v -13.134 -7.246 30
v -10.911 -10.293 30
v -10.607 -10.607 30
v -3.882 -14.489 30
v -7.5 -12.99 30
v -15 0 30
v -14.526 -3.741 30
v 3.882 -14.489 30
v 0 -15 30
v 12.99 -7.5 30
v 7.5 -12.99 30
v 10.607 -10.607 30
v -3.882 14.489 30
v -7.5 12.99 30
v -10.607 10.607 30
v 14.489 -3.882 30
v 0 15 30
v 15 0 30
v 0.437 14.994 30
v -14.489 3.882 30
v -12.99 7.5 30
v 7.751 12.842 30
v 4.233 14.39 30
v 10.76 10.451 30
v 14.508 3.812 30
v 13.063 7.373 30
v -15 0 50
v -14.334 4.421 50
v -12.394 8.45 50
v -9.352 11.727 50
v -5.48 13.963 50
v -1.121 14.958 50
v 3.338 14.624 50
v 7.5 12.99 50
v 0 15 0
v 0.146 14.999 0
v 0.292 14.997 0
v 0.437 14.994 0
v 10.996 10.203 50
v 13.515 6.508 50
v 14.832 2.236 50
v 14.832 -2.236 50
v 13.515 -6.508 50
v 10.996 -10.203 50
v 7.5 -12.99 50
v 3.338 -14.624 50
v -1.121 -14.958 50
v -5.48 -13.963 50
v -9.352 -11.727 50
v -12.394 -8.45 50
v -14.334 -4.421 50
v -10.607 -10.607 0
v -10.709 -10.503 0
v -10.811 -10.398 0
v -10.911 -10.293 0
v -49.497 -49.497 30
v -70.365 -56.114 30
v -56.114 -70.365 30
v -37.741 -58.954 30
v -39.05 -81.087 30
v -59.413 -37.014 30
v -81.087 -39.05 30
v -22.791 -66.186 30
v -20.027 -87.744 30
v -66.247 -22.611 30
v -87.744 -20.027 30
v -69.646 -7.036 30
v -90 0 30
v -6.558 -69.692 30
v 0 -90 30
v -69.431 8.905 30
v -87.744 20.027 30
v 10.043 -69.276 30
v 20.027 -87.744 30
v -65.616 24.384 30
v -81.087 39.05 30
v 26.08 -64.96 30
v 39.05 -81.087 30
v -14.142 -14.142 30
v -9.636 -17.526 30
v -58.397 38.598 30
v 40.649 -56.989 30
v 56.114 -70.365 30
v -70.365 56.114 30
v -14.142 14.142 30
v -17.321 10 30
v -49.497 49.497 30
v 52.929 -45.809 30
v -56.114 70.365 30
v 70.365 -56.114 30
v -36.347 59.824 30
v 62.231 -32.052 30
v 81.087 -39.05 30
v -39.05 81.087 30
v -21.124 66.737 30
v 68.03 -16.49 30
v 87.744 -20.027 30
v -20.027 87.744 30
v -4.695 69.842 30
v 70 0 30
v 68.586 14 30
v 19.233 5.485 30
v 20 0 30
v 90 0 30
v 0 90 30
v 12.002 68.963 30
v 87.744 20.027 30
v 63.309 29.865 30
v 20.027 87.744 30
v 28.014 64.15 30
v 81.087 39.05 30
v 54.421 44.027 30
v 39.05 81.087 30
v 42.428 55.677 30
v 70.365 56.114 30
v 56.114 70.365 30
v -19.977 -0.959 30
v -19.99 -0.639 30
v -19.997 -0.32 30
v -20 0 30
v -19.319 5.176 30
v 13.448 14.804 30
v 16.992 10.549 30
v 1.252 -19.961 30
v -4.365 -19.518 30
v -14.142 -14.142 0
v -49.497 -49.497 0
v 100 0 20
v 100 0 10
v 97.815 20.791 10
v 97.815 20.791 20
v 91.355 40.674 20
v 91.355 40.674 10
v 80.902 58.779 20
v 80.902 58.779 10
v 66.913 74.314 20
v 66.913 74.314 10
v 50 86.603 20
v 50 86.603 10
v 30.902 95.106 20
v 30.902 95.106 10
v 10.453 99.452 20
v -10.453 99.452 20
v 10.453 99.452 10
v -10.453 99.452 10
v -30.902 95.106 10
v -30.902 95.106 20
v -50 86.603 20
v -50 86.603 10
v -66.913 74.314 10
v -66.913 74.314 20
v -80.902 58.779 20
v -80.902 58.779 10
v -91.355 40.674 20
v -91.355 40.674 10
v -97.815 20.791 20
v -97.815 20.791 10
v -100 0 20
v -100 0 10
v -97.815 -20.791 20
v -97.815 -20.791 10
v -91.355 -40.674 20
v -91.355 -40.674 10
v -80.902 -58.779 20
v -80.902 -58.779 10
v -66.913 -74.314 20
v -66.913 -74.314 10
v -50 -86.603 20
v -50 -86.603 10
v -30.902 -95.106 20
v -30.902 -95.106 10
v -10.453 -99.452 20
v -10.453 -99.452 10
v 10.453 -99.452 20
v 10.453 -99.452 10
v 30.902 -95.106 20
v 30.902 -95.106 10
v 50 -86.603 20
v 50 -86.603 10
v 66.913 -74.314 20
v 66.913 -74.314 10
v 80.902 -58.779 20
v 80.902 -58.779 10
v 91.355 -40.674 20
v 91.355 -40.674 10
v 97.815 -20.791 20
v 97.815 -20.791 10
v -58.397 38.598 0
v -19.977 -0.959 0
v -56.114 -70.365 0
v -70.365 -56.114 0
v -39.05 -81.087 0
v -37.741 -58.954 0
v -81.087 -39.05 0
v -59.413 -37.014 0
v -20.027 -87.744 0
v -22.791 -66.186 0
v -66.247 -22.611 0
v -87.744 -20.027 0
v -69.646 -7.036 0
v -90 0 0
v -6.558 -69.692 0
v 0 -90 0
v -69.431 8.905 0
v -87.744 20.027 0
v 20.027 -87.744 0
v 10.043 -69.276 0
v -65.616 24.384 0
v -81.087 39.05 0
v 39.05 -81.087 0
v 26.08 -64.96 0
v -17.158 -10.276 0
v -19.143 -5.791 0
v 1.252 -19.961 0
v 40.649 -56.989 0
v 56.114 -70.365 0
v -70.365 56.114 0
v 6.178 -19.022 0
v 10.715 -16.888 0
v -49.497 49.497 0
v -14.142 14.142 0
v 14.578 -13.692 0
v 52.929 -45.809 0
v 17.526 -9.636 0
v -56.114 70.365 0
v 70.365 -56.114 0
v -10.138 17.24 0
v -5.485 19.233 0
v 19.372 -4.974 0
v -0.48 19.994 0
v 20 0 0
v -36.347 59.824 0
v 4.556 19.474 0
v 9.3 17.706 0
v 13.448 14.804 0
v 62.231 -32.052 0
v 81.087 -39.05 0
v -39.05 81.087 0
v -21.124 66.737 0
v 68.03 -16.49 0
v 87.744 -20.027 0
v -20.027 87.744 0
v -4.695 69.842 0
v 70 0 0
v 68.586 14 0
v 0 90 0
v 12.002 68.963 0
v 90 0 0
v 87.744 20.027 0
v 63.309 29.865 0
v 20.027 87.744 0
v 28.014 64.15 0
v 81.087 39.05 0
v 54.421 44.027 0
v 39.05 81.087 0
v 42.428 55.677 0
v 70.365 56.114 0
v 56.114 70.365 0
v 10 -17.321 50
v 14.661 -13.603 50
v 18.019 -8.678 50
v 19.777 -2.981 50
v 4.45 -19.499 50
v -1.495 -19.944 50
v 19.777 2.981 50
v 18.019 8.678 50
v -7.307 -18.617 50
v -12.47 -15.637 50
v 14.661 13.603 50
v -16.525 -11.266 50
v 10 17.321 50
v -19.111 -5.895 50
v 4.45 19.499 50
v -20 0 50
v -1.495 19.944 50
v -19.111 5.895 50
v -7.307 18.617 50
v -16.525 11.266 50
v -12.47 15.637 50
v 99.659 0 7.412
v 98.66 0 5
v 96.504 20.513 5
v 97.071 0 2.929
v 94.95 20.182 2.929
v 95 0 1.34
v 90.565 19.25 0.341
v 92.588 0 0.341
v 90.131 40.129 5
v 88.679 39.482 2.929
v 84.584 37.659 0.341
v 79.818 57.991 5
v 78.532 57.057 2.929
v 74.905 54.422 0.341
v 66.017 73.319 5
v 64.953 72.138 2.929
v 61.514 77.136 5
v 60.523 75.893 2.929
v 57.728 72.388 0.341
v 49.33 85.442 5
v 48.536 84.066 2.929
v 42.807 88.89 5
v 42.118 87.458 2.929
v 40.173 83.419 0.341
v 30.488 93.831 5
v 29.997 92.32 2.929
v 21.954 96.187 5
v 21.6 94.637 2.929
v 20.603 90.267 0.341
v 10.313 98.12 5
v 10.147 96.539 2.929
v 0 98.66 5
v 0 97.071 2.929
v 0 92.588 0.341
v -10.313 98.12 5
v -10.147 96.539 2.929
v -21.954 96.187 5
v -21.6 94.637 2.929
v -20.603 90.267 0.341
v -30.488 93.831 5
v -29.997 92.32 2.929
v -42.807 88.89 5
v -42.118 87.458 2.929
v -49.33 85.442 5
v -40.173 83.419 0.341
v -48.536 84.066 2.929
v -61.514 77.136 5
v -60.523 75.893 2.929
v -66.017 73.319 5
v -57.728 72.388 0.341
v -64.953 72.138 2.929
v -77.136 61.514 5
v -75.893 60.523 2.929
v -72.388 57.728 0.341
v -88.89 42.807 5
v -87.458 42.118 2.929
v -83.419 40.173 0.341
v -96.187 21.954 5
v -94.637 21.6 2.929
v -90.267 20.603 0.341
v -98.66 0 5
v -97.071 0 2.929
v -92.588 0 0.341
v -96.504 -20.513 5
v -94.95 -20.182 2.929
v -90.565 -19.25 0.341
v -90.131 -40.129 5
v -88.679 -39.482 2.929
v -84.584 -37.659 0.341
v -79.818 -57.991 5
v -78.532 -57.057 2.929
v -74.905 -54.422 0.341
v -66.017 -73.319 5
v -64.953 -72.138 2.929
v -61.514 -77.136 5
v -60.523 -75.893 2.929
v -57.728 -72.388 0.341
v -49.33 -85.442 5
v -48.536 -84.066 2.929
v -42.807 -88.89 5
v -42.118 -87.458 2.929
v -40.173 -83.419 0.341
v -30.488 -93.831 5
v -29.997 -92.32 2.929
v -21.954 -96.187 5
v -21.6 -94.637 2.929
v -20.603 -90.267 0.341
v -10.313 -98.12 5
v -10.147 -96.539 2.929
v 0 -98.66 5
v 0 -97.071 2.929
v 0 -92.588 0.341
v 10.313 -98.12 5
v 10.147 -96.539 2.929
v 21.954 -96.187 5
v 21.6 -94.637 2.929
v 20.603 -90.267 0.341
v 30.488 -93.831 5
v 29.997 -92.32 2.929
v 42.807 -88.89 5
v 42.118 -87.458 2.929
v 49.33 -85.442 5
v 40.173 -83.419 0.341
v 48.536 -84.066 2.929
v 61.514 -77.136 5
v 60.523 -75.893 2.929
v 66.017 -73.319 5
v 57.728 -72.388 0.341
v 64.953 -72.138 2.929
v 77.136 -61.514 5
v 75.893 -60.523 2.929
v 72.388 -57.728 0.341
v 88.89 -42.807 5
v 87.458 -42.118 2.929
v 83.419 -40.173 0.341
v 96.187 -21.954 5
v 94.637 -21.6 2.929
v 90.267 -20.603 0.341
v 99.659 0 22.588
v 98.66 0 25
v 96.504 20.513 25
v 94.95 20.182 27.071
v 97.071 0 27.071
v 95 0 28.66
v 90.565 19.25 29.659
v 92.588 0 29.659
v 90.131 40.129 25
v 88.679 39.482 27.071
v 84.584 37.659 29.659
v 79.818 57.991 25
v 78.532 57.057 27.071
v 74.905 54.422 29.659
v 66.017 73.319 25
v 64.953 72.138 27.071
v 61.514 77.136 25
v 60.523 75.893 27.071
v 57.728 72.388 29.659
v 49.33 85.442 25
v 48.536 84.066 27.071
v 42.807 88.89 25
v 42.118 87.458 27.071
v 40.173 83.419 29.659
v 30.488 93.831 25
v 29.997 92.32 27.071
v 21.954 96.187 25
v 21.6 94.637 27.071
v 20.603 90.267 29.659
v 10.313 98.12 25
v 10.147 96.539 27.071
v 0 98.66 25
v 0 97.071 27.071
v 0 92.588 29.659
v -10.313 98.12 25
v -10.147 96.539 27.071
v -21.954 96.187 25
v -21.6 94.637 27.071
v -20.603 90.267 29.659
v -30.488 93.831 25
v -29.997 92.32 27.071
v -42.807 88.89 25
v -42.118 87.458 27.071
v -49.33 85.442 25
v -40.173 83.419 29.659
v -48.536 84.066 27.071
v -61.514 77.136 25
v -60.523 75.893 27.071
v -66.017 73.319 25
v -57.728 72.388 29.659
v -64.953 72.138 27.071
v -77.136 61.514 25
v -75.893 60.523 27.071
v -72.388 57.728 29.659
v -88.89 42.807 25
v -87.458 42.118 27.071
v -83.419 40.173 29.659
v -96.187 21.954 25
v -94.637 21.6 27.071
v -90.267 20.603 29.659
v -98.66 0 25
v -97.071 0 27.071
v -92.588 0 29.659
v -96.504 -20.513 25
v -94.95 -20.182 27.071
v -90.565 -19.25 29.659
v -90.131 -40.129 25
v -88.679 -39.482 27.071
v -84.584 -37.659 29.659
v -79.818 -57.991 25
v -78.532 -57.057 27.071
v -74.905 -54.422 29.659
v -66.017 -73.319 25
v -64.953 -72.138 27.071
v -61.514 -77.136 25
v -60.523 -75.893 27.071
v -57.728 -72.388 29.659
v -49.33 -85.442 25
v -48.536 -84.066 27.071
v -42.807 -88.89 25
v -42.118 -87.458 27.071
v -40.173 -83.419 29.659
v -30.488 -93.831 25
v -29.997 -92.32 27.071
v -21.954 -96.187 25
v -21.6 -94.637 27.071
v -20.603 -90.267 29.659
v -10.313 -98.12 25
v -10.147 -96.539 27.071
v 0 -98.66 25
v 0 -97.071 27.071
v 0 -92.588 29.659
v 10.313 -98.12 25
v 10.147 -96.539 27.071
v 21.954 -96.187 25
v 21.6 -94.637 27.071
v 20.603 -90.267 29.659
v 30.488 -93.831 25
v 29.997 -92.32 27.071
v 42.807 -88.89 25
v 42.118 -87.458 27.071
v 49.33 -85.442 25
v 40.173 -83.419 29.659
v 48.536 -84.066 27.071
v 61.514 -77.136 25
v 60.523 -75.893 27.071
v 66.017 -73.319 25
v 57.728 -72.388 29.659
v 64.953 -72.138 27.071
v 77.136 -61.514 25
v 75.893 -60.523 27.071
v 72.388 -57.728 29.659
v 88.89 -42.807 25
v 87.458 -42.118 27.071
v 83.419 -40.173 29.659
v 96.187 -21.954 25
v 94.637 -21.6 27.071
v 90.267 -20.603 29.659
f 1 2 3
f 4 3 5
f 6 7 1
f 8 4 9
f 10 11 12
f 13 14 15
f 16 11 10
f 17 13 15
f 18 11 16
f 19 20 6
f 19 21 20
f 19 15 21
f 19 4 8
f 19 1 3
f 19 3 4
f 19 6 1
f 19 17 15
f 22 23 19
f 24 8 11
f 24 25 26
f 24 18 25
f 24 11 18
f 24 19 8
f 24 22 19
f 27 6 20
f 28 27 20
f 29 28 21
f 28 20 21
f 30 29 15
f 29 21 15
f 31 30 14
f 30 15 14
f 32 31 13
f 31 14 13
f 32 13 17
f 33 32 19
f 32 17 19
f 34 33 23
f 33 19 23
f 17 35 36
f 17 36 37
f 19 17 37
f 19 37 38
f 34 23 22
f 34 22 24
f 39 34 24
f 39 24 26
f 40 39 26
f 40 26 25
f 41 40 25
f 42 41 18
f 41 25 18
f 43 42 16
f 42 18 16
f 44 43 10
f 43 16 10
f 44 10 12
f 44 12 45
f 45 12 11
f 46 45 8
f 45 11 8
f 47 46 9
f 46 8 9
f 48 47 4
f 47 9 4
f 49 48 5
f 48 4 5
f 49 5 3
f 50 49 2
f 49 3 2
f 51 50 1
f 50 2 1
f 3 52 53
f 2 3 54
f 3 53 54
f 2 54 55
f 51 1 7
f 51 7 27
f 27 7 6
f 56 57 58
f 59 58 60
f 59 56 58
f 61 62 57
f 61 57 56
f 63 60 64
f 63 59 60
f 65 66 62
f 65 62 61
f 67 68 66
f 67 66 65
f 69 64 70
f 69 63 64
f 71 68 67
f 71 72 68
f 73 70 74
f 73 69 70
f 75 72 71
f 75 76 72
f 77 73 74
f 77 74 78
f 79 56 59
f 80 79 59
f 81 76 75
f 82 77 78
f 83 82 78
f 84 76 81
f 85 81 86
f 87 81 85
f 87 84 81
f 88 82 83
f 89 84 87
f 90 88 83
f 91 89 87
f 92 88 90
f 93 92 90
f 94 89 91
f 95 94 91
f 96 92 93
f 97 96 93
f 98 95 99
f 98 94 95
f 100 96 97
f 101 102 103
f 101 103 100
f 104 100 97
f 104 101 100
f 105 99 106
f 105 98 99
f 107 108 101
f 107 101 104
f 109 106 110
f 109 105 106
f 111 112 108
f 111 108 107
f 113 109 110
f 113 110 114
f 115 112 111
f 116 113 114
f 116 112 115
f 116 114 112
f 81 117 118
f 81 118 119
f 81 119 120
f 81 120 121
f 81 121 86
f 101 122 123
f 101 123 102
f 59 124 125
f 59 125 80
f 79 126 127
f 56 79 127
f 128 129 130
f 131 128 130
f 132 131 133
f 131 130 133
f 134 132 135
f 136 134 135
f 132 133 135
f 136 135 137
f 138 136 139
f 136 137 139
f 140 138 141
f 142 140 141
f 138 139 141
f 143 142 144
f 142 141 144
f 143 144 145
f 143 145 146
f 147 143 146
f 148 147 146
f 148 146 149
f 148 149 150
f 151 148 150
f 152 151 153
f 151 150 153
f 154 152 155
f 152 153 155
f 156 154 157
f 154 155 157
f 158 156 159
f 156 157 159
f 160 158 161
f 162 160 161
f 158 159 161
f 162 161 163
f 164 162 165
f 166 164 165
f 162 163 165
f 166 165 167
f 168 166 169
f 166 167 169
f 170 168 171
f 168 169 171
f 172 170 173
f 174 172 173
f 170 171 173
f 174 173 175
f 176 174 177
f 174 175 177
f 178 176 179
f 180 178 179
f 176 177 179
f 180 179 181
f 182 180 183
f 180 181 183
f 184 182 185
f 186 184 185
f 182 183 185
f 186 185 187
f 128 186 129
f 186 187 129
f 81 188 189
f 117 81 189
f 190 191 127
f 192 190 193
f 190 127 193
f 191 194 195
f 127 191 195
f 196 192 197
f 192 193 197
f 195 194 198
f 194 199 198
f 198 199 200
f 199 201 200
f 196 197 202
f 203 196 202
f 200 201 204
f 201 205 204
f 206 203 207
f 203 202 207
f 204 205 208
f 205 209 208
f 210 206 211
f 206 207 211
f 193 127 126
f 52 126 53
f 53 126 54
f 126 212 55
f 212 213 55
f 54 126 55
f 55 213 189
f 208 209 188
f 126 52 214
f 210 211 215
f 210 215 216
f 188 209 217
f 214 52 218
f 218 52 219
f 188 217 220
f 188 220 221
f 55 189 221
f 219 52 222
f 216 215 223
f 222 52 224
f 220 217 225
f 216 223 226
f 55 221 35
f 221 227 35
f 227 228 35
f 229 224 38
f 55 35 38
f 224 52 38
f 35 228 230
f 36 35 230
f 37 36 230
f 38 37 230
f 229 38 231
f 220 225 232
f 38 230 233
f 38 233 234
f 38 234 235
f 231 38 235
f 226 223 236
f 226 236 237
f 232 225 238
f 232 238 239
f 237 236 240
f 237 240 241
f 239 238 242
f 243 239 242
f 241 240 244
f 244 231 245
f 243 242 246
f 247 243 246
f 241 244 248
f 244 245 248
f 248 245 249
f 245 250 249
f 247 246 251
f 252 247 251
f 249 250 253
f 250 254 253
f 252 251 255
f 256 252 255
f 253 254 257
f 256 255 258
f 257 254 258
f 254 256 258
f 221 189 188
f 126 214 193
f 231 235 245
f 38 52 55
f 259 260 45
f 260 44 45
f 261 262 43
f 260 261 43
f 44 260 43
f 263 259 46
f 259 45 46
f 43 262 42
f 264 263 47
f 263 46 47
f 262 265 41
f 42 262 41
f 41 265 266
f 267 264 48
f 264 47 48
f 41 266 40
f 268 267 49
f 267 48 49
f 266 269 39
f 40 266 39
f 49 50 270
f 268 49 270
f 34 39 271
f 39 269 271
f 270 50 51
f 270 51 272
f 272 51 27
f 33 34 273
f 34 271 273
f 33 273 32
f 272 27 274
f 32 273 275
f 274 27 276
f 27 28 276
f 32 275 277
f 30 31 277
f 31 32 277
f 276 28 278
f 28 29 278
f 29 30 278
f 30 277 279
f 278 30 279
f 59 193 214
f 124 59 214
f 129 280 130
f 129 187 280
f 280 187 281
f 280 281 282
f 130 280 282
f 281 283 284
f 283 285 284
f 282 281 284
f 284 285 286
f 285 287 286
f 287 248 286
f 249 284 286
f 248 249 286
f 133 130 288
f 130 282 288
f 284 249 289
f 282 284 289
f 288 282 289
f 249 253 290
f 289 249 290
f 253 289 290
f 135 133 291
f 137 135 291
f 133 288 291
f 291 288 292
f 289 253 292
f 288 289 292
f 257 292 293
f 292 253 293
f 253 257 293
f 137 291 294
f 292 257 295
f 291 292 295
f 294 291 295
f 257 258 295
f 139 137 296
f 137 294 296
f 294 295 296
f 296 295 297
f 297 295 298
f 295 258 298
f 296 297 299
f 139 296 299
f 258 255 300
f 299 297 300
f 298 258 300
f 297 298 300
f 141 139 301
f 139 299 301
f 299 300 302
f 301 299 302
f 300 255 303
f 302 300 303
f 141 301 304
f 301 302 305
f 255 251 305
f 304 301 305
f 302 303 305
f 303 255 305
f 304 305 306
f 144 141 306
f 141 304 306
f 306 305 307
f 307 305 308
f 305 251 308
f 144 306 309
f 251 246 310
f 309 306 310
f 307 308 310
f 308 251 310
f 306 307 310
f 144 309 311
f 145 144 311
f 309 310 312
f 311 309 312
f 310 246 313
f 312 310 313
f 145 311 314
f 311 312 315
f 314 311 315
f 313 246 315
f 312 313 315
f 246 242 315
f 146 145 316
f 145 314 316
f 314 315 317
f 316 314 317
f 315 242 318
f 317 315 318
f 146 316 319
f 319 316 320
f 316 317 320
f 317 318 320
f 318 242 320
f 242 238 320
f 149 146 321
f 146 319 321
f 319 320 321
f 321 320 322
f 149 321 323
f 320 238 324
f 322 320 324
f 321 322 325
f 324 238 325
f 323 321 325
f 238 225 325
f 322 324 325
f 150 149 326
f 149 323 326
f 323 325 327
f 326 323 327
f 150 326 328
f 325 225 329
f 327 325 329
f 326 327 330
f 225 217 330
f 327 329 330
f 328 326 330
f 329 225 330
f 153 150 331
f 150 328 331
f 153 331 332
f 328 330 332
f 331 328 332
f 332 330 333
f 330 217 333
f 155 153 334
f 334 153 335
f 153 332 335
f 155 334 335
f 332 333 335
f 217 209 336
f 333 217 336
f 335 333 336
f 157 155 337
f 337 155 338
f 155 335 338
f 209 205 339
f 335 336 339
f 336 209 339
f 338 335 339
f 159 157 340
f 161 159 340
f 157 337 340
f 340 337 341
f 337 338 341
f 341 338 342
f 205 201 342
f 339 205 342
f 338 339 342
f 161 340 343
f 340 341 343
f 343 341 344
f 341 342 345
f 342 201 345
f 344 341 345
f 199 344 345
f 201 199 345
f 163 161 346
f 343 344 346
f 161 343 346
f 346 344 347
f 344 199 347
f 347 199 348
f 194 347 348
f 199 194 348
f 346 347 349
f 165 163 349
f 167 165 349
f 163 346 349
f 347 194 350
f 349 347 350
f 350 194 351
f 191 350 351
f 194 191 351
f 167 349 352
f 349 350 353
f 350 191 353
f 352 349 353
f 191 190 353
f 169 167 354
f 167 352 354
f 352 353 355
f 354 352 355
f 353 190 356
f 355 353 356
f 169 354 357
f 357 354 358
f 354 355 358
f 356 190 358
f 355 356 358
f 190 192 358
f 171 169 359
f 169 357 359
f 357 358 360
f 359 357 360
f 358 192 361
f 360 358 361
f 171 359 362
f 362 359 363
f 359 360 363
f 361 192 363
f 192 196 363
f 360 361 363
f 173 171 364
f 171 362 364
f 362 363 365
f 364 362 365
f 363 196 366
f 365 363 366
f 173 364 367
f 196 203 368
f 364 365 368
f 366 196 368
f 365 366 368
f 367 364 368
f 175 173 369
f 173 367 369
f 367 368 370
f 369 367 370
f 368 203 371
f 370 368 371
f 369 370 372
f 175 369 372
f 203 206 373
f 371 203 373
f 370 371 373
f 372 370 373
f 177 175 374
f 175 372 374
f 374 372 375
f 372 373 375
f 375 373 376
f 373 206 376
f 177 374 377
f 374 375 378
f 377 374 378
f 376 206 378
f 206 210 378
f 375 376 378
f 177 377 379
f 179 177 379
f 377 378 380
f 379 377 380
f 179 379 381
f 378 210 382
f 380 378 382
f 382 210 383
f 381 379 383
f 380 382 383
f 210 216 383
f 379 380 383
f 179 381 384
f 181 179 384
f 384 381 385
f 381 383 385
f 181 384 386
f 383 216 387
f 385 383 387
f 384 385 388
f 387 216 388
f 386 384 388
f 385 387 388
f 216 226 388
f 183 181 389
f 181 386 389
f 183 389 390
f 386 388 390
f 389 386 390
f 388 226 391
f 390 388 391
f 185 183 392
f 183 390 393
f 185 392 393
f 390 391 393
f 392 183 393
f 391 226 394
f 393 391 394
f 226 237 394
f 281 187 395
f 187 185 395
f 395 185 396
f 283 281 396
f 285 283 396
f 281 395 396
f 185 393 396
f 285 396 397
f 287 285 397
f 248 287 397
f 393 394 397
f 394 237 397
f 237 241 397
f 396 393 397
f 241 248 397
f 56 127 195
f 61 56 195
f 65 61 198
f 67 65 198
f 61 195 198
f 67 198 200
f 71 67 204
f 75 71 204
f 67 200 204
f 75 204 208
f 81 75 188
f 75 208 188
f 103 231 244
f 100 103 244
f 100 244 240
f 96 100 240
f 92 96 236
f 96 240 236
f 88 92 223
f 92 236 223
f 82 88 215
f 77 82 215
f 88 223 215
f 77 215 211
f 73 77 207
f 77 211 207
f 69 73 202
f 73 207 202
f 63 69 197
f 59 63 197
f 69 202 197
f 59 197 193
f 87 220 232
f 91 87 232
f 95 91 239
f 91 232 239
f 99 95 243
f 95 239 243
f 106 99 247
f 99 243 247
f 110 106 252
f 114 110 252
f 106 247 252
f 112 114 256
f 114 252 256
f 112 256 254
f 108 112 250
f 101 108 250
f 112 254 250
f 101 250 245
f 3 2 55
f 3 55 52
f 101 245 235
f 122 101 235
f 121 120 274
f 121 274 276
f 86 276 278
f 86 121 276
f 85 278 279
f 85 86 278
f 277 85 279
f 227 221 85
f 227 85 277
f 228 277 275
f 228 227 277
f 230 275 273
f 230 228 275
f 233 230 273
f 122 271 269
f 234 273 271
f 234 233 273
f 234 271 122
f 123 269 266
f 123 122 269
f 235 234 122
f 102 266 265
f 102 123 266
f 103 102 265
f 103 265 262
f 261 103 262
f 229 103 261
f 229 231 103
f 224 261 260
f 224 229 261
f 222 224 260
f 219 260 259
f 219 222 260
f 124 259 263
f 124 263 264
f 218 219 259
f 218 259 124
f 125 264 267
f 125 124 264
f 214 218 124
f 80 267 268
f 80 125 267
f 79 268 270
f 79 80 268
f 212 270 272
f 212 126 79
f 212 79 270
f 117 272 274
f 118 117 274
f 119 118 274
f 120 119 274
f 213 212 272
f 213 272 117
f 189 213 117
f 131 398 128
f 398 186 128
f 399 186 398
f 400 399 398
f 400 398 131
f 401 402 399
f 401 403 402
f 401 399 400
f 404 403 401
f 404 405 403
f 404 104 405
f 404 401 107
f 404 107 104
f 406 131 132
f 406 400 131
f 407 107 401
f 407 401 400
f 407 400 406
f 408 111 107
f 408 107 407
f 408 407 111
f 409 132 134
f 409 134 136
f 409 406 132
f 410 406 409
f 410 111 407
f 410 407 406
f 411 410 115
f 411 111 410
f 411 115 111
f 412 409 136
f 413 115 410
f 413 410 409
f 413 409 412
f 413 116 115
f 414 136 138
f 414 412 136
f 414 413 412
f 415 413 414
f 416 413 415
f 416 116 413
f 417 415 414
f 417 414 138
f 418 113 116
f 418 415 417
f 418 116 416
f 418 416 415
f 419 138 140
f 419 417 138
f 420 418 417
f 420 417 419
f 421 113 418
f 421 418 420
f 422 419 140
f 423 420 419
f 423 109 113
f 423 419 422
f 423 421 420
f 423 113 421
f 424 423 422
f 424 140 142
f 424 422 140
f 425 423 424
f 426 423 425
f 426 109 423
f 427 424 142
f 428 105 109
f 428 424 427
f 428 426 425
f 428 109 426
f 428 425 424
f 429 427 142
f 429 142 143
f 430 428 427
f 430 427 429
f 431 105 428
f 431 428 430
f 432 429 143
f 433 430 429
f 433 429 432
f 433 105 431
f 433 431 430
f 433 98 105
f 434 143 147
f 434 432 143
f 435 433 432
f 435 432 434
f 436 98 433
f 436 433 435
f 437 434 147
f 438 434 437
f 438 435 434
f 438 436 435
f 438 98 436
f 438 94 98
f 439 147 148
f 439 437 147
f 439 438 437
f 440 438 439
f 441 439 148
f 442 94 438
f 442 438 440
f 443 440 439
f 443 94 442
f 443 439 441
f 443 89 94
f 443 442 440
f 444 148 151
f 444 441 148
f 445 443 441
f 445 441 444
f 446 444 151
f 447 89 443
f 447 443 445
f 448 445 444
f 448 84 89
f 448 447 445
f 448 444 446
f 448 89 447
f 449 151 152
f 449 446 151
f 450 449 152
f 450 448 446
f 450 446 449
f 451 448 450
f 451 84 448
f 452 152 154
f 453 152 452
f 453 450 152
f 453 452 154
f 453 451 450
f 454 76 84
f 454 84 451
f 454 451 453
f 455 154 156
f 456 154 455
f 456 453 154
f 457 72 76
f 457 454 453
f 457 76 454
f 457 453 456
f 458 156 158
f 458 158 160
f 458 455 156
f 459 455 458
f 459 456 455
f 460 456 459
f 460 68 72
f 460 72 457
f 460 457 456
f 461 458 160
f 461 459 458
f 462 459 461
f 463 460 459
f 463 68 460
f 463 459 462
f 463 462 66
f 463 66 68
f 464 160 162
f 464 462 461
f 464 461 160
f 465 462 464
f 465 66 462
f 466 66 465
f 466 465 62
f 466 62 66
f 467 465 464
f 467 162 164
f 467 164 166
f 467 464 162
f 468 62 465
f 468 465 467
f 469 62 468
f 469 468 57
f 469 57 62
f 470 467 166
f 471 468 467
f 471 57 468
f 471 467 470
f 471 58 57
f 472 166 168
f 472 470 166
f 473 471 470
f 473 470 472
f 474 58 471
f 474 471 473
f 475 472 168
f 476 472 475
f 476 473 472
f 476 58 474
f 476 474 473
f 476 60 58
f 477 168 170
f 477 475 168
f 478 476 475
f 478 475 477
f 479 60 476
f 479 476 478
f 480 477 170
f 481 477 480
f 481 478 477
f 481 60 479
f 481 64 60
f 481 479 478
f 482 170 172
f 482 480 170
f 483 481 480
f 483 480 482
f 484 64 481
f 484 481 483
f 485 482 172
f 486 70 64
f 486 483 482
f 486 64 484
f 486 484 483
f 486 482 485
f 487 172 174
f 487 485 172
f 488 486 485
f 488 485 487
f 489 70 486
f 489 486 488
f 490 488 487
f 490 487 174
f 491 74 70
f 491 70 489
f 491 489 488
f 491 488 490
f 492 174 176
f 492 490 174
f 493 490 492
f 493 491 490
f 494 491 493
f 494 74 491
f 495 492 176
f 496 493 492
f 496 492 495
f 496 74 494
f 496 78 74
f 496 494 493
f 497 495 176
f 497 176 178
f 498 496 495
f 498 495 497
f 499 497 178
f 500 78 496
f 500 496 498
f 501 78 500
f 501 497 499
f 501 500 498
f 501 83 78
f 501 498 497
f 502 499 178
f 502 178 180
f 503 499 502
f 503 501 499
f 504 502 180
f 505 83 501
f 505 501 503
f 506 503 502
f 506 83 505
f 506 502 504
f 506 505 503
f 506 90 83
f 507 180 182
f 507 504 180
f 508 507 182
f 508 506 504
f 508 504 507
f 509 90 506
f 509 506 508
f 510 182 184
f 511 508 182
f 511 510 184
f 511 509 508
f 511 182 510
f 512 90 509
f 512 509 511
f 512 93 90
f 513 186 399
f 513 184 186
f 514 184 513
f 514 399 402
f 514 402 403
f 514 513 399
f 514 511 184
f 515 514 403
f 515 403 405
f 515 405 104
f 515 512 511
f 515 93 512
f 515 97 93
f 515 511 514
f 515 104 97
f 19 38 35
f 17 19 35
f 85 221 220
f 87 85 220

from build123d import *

# Parameters (mm, degrees)
SKETCH1_R           = 100
BOSS_EXTRUDE1_DEPTH = 30
FILLET2_R           = 10
SKETCH2_R           = 20
SKETCH2_R_2         = 15
BOSS_EXTRUDE2_DEPTH = 50


with BuildPart() as part:
    # Sketch1 → Boss-Extrude1 (new body)
    with BuildSketch(Plane.XY):
        Circle(SKETCH1_R)
        with BuildLine():
            Line((-10.606601718, -10.606601718), (-49.497474683, -49.497474683))
            ThreePointArc((-49.497474683, -49.497474683), (-69.64553071, -7.03562734), (-58.396917549, 38.597927675))
            Line((-58.396917549, 38.597927675), (-10.606601718, -10.606601718))
        make_face(mode=Mode.SUBTRACT)
        with BuildLine():
            ThreePointArc((10.606601718, -10.606601718), (13.858192988, -5.740251485), (15, 0))
            Line((15, 0), (70, 0))
            ThreePointArc((70, 0), (33.601511791, -61.407966954), (-37.741097297, -58.954300732))
            Line((-37.741097297, -58.954300732), (10.606601718, -10.606601718))
        make_face(mode=Mode.SUBTRACT)
        with BuildLine():
            ThreePointArc((0, 15), (-5.740251485, 13.858192988), (-10.606601718, 10.606601718))
            Line((-10.606601718, 10.606601718), (-49.497474683, 49.497474683))
            ThreePointArc((-49.497474683, 49.497474683), (20.152118643, 67.036498374), (68.585712798, 14))
            Line((68.585712798, 14), (0, 15))
        make_face(mode=Mode.SUBTRACT)
    extrude(amount=BOSS_EXTRUDE1_DEPTH)

    # Fillet2
    fillet2_edges = [part.edges().sort_by_distance(p)[0] for p in [
        (-100, 0, 0),
        (-100, 0, 30),
    ]]
    fillet(fillet2_edges, radius=FILLET2_R)

    # Sketch2 → Boss-Extrude2 (add)
    with BuildSketch(Plane(origin=(0, 0, 0), x_dir=(-1, 0, 0), z_dir=(0, 0, -1))):
        Circle(SKETCH2_R)
        Circle(SKETCH2_R_2, mode=Mode.SUBTRACT)
    extrude(amount=-BOSS_EXTRUDE2_DEPTH)


solid = part.part
